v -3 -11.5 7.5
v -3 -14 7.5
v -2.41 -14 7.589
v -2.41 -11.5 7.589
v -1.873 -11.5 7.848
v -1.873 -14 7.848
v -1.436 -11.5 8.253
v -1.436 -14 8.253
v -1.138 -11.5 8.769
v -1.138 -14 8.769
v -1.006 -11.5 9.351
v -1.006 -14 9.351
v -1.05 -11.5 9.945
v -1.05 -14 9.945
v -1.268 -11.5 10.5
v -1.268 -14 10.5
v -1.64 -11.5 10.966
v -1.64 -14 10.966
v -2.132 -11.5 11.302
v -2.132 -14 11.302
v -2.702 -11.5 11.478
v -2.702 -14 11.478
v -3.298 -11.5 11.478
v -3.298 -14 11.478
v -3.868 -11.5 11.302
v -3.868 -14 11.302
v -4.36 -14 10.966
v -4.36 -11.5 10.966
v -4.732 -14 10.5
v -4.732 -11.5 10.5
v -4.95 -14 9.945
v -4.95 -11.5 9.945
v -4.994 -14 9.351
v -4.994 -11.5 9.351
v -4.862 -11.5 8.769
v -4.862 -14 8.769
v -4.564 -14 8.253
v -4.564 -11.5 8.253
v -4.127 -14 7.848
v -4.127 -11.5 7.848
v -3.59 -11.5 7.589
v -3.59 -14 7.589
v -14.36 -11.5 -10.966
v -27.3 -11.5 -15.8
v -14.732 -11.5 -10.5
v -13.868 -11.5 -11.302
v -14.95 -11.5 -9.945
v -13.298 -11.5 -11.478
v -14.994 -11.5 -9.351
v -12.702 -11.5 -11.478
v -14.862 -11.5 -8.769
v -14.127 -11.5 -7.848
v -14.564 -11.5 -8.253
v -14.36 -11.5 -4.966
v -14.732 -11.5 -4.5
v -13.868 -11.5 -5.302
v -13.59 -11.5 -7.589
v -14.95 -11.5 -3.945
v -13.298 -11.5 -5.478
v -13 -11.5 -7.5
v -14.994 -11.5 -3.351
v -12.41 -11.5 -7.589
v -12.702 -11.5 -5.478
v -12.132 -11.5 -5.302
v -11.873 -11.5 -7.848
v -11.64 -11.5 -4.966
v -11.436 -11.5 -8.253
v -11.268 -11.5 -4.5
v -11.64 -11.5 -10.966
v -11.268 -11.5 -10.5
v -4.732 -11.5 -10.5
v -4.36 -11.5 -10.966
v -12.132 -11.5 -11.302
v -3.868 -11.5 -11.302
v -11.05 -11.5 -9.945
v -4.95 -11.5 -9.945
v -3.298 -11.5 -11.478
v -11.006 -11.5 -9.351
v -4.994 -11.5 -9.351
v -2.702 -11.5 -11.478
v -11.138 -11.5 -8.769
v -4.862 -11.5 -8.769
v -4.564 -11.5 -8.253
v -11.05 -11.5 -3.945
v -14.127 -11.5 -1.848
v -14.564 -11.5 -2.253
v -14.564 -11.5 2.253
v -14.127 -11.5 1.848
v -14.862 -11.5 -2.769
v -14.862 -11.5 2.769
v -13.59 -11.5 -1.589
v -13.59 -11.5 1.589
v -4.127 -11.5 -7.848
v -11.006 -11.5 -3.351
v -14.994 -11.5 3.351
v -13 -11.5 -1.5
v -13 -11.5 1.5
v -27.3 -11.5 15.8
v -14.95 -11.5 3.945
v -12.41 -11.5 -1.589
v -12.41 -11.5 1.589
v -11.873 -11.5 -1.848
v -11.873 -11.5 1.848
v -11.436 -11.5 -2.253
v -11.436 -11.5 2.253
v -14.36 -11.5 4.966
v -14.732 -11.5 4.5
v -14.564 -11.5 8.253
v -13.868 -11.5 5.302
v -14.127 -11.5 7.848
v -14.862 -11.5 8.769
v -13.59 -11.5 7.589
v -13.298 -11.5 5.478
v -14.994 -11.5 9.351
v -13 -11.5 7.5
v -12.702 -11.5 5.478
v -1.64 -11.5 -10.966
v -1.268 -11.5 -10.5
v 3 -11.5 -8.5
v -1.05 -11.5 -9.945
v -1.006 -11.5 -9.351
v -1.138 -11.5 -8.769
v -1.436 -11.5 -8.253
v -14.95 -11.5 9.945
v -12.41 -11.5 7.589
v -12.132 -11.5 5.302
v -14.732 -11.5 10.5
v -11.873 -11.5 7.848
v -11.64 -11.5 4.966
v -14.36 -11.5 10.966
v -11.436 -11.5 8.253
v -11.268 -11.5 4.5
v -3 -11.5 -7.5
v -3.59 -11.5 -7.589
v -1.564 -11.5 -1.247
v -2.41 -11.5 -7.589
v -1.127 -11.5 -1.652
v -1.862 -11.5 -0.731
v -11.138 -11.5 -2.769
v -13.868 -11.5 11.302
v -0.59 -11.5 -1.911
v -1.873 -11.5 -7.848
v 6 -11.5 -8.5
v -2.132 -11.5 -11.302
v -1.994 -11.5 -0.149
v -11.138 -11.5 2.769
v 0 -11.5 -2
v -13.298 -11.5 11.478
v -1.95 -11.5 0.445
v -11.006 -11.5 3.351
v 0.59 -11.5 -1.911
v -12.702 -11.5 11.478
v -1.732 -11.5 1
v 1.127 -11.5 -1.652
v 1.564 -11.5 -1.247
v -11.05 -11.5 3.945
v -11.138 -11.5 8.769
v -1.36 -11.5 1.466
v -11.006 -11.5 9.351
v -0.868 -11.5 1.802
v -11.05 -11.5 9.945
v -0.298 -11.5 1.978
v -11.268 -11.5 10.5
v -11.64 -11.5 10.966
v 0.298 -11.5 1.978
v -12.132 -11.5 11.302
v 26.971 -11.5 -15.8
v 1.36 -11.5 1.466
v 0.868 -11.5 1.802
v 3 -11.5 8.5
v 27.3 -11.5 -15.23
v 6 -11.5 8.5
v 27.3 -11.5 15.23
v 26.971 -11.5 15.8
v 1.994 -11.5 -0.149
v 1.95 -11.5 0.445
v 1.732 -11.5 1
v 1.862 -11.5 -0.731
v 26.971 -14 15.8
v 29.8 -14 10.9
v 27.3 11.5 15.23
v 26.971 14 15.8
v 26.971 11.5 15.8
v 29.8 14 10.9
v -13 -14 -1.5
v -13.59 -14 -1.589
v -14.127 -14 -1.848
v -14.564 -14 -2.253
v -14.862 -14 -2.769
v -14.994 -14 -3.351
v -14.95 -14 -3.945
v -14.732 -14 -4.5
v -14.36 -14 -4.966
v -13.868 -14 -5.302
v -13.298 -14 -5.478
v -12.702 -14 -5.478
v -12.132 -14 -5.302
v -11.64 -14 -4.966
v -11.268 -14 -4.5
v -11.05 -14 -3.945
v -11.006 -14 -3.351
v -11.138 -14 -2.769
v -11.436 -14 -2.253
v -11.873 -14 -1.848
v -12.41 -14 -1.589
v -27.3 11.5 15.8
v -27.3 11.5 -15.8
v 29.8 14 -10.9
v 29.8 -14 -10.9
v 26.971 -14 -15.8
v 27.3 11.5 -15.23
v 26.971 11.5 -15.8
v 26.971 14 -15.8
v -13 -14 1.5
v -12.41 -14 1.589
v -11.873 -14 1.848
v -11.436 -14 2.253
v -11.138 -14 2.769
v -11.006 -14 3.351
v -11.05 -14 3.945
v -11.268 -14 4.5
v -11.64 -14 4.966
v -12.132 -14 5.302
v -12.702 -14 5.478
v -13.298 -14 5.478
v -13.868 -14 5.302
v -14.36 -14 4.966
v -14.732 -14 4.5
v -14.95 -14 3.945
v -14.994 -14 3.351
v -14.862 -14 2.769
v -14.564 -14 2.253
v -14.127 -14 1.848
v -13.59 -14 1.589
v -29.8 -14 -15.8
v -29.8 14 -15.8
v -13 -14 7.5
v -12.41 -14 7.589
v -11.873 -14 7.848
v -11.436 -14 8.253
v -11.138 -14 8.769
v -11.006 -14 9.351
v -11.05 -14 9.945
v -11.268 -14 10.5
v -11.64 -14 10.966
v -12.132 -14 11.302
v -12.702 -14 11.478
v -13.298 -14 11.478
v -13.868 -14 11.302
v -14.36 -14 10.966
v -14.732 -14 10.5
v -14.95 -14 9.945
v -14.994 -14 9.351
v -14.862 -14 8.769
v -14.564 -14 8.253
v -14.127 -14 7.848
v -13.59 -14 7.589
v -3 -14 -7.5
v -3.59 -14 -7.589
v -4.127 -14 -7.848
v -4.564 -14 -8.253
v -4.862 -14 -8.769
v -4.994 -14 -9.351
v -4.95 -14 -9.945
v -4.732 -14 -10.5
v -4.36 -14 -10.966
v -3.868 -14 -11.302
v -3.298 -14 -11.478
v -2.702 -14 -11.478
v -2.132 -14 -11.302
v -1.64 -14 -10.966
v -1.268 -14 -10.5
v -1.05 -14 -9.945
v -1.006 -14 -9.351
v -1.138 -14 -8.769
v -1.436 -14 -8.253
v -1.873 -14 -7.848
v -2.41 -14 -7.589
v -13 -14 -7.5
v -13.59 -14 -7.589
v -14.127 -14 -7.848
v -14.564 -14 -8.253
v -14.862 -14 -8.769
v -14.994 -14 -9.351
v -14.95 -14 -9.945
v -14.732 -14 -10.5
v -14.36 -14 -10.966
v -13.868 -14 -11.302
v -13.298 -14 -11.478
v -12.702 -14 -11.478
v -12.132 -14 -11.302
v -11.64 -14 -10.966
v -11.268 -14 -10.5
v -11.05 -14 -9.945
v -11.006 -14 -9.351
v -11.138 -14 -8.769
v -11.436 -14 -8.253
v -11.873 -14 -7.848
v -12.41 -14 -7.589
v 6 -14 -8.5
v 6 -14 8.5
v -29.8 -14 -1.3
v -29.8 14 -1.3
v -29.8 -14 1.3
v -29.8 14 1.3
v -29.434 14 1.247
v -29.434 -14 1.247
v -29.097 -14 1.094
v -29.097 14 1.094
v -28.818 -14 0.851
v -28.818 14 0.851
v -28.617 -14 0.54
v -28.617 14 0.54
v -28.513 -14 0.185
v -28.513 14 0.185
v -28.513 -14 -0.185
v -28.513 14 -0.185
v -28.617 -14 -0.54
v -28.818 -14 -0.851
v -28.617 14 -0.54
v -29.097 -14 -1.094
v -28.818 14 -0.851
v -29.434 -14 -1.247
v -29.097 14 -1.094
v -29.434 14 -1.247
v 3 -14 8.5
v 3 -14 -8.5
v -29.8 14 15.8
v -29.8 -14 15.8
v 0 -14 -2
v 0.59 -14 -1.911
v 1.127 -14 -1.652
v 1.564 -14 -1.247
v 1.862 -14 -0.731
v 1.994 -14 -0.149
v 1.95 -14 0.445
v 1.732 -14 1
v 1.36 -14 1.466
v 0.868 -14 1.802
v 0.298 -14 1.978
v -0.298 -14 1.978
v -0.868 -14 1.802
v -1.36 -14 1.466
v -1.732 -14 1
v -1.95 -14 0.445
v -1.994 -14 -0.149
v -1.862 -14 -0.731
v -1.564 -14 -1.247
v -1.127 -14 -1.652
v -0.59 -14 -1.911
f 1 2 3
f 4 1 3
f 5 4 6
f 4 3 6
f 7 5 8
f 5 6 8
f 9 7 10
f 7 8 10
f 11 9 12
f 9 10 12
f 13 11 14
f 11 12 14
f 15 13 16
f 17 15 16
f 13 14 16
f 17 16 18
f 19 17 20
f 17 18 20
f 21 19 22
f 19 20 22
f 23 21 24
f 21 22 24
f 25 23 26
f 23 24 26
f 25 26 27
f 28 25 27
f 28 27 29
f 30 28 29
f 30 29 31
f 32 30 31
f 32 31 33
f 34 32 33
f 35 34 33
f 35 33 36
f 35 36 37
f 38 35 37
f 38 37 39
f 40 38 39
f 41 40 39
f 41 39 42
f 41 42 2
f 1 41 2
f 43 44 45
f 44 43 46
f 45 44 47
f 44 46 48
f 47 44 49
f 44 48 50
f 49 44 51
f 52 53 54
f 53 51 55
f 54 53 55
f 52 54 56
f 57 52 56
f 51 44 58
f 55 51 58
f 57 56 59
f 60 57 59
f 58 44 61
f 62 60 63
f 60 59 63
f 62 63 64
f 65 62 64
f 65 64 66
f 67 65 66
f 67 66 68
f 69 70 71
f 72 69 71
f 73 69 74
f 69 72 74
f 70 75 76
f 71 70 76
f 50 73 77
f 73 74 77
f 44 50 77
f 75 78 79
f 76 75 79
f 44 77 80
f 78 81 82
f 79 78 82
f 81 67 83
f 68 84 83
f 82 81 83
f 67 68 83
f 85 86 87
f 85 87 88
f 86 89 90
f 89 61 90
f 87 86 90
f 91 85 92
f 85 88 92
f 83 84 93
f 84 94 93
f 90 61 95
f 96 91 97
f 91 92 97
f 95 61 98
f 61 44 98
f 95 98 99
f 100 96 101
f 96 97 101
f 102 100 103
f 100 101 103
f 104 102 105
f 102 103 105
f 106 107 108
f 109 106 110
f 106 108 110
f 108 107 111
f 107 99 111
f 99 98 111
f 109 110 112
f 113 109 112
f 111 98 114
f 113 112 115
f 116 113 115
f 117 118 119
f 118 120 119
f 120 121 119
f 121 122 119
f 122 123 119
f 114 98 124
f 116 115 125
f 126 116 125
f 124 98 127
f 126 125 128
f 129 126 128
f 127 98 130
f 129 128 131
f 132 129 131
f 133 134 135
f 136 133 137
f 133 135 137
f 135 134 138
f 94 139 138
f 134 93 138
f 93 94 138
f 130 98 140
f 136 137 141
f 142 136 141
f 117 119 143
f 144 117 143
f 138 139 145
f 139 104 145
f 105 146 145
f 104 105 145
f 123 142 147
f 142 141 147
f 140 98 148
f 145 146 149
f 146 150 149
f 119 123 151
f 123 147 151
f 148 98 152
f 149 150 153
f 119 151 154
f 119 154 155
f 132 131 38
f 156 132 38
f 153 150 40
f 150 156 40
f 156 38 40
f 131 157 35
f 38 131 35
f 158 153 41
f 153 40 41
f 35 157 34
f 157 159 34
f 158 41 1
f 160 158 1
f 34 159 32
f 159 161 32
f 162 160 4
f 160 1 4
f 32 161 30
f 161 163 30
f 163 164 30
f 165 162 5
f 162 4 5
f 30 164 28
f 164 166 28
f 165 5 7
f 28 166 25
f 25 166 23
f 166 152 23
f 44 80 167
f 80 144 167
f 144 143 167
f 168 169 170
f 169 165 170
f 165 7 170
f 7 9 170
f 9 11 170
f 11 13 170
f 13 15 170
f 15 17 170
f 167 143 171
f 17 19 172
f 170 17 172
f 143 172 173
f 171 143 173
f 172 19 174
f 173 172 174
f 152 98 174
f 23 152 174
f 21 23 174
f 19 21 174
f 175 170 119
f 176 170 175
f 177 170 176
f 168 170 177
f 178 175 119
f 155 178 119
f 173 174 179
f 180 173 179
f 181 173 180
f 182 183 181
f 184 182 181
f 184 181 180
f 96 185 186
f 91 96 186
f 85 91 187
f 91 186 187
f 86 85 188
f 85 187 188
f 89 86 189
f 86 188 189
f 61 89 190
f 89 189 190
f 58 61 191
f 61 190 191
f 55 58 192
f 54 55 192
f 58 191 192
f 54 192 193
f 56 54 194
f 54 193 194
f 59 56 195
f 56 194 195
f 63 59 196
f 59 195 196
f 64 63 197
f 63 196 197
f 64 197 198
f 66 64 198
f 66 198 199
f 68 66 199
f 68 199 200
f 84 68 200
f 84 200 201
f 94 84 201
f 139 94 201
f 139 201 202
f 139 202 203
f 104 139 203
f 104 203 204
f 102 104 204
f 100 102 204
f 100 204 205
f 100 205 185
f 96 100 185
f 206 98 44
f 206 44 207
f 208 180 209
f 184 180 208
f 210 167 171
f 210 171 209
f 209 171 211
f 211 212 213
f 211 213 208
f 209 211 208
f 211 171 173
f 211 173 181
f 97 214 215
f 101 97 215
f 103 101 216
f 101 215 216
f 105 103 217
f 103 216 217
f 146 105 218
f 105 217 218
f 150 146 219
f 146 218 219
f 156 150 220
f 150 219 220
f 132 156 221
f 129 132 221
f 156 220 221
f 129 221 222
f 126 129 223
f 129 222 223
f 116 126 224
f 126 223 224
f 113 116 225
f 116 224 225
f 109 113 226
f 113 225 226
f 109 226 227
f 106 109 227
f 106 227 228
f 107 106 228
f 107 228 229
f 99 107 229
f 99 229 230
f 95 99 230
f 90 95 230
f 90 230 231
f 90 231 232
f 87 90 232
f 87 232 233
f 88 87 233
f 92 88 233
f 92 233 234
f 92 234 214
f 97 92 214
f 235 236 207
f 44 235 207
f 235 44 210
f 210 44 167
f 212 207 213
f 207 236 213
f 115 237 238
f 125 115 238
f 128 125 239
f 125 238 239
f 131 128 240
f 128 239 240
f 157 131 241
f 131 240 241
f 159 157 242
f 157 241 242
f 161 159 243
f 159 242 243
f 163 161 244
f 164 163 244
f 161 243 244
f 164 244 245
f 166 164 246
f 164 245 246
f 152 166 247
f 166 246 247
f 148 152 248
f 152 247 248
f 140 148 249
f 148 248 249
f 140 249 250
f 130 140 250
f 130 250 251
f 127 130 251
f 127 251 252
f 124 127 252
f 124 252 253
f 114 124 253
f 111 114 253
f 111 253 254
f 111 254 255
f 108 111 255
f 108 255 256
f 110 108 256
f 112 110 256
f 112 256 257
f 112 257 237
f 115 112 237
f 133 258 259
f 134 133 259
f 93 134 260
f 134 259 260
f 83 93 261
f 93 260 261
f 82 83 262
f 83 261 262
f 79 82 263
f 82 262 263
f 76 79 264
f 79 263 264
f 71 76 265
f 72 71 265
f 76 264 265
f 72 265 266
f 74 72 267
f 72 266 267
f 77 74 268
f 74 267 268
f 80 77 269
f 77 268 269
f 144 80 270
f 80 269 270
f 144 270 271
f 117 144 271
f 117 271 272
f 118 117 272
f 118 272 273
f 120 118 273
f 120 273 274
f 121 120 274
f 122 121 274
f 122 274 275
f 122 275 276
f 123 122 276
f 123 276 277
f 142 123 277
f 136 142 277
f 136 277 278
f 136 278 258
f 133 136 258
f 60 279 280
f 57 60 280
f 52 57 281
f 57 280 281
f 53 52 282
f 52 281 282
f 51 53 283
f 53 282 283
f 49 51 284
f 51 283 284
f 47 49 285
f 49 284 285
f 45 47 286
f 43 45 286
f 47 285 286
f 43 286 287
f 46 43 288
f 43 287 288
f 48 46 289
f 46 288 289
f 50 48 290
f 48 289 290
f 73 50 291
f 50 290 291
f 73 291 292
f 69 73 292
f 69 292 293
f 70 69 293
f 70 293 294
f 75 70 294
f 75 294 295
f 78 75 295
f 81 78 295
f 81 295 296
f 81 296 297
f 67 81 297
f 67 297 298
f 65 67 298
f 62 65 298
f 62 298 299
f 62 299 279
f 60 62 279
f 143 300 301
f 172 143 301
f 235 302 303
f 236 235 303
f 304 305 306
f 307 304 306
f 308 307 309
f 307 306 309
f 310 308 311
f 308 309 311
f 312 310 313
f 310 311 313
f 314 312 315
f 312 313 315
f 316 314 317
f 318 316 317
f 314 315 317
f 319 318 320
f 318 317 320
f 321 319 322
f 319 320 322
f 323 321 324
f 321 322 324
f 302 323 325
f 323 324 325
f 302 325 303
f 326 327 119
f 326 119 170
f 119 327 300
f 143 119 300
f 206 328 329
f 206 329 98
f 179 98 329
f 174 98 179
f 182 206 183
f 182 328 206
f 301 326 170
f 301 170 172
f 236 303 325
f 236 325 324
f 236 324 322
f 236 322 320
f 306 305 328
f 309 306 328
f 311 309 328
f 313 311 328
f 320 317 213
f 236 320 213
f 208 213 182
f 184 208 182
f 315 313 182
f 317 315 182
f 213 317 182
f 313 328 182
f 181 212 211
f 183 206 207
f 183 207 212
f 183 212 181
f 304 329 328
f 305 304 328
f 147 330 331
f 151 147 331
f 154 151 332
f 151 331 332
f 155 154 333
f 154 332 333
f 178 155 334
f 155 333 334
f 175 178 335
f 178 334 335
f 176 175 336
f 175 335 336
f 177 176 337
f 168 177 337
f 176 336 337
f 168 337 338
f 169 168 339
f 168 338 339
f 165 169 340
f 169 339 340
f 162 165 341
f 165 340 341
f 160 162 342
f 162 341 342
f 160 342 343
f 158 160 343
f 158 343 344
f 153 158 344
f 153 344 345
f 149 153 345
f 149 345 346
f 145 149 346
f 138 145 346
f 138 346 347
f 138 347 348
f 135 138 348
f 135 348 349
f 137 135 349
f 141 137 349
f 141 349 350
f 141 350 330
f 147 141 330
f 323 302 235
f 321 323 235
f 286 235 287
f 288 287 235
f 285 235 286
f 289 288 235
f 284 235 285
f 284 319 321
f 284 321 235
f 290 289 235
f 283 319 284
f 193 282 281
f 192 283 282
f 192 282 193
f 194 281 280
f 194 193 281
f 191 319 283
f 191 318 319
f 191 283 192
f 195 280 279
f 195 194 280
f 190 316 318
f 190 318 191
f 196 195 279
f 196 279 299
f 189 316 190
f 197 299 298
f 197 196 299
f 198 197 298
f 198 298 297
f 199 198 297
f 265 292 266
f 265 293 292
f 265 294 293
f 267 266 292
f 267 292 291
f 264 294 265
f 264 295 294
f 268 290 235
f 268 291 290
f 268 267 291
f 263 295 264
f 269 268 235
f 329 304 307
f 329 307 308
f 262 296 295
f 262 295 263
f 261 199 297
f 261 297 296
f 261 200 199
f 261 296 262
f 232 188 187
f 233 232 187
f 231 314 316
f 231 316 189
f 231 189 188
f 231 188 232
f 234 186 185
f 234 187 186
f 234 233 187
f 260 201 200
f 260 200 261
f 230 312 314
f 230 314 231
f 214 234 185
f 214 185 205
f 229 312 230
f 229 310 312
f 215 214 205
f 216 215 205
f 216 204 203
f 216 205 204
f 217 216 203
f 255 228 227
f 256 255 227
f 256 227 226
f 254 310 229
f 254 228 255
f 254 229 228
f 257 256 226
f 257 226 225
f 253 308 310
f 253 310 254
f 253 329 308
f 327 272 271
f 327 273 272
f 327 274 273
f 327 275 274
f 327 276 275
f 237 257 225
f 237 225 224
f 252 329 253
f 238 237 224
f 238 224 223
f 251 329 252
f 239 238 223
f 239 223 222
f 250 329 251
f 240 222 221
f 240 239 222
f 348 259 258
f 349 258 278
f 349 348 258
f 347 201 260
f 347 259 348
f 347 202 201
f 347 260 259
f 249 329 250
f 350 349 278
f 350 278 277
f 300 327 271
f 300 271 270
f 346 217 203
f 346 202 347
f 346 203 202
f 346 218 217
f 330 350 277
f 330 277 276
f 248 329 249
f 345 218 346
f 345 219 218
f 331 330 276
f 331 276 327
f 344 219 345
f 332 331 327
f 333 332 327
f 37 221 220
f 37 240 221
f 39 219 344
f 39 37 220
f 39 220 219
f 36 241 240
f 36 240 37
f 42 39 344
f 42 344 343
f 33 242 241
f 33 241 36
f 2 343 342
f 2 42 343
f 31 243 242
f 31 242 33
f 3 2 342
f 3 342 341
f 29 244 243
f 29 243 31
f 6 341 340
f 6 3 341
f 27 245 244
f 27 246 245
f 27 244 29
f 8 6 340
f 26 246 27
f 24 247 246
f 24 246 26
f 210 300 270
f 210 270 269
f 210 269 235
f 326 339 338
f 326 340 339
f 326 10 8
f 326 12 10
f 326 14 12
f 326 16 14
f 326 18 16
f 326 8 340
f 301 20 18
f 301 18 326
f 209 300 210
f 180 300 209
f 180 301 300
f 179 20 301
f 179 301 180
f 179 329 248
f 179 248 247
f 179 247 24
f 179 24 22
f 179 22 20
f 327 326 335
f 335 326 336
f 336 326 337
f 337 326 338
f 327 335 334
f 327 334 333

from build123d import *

# Parameters (mm, degrees)
VISTA_FRONTAL_W       = 59.6
VISTA_FRONTAL_H       = 28
VISTA_FRONTAL_W_2     = 54.6
VISTA_FRONTAL_H_2     = 23
CORPO_DO_MODULO_DEPTH = 15.8
ESBO_O3_R             = 1.3
CORTE_EXTRUS_O1_DEPTH = 44.836970698
ESBO_O4_R             = 2
ESBO_O4_W             = 3
ESBO_O4_H             = 17
CORTE_EXTRUS_O2_DEPTH = 3.6


with BuildPart() as part:
    # Vista Frontal → Corpo do Modulo (new, symmetric)
    with BuildSketch(Plane.XY):
        Rectangle(VISTA_FRONTAL_W, VISTA_FRONTAL_H)
        Rectangle(VISTA_FRONTAL_W_2, VISTA_FRONTAL_H_2, mode=Mode.SUBTRACT)
    extrude(amount=CORPO_DO_MODULO_DEPTH, both=True)

    # Esboço3 → Corte-extrusão1 (cut, through all)
    with BuildSketch(Plane(origin=(0, 14, 0), x_dir=(1, 0, 0), z_dir=(0, 1, 0))):
        with Locations((-29.8, 0)):
            Circle(ESBO_O3_R)
        Polygon((26.970983681, -15.8), (29.8, -10.9), (29.8, -15.8), align=None)
        Polygon((29.8, 15.8), (26.970983681, 15.8), (29.8, 10.9), align=None)
    extrude(amount=-CORTE_EXTRUS_O1_DEPTH, mode=Mode.SUBTRACT)

    # Esboço4 → Corte-extrusão2 (cut)
    with BuildSketch(Plane.XZ.offset(14)):
        with Locations(Location((0, 0, 0), (0, 0, 270))):
            Circle(ESBO_O4_R)
        with Locations(Location((-3, 9.5, 0), (0, 0, 270))):
            Circle(ESBO_O4_R)
        with Locations(Location((-13, 9.5, 0), (0, 0, 270))):
            Circle(ESBO_O4_R)
        with Locations(Location((-13, 3.5, 0), (0, 0, 270))):
            Circle(ESBO_O4_R)
        with Locations(Location((-13, -3.5, 0), (0, 0, 90))):
            Circle(ESBO_O4_R)
        with Locations(Location((-13, -9.5, 0), (0, 0, 90))):
            Circle(ESBO_O4_R)
        with Locations(Location((-3, -9.5, 0), (0, 0, 90))):
            Circle(ESBO_O4_R)
        with Locations((4.5, 0)):
            Rectangle(ESBO_O4_W, ESBO_O4_H)
    extrude(amount=-CORTE_EXTRUS_O2_DEPTH, mode=Mode.SUBTRACT)


solid = part.part
